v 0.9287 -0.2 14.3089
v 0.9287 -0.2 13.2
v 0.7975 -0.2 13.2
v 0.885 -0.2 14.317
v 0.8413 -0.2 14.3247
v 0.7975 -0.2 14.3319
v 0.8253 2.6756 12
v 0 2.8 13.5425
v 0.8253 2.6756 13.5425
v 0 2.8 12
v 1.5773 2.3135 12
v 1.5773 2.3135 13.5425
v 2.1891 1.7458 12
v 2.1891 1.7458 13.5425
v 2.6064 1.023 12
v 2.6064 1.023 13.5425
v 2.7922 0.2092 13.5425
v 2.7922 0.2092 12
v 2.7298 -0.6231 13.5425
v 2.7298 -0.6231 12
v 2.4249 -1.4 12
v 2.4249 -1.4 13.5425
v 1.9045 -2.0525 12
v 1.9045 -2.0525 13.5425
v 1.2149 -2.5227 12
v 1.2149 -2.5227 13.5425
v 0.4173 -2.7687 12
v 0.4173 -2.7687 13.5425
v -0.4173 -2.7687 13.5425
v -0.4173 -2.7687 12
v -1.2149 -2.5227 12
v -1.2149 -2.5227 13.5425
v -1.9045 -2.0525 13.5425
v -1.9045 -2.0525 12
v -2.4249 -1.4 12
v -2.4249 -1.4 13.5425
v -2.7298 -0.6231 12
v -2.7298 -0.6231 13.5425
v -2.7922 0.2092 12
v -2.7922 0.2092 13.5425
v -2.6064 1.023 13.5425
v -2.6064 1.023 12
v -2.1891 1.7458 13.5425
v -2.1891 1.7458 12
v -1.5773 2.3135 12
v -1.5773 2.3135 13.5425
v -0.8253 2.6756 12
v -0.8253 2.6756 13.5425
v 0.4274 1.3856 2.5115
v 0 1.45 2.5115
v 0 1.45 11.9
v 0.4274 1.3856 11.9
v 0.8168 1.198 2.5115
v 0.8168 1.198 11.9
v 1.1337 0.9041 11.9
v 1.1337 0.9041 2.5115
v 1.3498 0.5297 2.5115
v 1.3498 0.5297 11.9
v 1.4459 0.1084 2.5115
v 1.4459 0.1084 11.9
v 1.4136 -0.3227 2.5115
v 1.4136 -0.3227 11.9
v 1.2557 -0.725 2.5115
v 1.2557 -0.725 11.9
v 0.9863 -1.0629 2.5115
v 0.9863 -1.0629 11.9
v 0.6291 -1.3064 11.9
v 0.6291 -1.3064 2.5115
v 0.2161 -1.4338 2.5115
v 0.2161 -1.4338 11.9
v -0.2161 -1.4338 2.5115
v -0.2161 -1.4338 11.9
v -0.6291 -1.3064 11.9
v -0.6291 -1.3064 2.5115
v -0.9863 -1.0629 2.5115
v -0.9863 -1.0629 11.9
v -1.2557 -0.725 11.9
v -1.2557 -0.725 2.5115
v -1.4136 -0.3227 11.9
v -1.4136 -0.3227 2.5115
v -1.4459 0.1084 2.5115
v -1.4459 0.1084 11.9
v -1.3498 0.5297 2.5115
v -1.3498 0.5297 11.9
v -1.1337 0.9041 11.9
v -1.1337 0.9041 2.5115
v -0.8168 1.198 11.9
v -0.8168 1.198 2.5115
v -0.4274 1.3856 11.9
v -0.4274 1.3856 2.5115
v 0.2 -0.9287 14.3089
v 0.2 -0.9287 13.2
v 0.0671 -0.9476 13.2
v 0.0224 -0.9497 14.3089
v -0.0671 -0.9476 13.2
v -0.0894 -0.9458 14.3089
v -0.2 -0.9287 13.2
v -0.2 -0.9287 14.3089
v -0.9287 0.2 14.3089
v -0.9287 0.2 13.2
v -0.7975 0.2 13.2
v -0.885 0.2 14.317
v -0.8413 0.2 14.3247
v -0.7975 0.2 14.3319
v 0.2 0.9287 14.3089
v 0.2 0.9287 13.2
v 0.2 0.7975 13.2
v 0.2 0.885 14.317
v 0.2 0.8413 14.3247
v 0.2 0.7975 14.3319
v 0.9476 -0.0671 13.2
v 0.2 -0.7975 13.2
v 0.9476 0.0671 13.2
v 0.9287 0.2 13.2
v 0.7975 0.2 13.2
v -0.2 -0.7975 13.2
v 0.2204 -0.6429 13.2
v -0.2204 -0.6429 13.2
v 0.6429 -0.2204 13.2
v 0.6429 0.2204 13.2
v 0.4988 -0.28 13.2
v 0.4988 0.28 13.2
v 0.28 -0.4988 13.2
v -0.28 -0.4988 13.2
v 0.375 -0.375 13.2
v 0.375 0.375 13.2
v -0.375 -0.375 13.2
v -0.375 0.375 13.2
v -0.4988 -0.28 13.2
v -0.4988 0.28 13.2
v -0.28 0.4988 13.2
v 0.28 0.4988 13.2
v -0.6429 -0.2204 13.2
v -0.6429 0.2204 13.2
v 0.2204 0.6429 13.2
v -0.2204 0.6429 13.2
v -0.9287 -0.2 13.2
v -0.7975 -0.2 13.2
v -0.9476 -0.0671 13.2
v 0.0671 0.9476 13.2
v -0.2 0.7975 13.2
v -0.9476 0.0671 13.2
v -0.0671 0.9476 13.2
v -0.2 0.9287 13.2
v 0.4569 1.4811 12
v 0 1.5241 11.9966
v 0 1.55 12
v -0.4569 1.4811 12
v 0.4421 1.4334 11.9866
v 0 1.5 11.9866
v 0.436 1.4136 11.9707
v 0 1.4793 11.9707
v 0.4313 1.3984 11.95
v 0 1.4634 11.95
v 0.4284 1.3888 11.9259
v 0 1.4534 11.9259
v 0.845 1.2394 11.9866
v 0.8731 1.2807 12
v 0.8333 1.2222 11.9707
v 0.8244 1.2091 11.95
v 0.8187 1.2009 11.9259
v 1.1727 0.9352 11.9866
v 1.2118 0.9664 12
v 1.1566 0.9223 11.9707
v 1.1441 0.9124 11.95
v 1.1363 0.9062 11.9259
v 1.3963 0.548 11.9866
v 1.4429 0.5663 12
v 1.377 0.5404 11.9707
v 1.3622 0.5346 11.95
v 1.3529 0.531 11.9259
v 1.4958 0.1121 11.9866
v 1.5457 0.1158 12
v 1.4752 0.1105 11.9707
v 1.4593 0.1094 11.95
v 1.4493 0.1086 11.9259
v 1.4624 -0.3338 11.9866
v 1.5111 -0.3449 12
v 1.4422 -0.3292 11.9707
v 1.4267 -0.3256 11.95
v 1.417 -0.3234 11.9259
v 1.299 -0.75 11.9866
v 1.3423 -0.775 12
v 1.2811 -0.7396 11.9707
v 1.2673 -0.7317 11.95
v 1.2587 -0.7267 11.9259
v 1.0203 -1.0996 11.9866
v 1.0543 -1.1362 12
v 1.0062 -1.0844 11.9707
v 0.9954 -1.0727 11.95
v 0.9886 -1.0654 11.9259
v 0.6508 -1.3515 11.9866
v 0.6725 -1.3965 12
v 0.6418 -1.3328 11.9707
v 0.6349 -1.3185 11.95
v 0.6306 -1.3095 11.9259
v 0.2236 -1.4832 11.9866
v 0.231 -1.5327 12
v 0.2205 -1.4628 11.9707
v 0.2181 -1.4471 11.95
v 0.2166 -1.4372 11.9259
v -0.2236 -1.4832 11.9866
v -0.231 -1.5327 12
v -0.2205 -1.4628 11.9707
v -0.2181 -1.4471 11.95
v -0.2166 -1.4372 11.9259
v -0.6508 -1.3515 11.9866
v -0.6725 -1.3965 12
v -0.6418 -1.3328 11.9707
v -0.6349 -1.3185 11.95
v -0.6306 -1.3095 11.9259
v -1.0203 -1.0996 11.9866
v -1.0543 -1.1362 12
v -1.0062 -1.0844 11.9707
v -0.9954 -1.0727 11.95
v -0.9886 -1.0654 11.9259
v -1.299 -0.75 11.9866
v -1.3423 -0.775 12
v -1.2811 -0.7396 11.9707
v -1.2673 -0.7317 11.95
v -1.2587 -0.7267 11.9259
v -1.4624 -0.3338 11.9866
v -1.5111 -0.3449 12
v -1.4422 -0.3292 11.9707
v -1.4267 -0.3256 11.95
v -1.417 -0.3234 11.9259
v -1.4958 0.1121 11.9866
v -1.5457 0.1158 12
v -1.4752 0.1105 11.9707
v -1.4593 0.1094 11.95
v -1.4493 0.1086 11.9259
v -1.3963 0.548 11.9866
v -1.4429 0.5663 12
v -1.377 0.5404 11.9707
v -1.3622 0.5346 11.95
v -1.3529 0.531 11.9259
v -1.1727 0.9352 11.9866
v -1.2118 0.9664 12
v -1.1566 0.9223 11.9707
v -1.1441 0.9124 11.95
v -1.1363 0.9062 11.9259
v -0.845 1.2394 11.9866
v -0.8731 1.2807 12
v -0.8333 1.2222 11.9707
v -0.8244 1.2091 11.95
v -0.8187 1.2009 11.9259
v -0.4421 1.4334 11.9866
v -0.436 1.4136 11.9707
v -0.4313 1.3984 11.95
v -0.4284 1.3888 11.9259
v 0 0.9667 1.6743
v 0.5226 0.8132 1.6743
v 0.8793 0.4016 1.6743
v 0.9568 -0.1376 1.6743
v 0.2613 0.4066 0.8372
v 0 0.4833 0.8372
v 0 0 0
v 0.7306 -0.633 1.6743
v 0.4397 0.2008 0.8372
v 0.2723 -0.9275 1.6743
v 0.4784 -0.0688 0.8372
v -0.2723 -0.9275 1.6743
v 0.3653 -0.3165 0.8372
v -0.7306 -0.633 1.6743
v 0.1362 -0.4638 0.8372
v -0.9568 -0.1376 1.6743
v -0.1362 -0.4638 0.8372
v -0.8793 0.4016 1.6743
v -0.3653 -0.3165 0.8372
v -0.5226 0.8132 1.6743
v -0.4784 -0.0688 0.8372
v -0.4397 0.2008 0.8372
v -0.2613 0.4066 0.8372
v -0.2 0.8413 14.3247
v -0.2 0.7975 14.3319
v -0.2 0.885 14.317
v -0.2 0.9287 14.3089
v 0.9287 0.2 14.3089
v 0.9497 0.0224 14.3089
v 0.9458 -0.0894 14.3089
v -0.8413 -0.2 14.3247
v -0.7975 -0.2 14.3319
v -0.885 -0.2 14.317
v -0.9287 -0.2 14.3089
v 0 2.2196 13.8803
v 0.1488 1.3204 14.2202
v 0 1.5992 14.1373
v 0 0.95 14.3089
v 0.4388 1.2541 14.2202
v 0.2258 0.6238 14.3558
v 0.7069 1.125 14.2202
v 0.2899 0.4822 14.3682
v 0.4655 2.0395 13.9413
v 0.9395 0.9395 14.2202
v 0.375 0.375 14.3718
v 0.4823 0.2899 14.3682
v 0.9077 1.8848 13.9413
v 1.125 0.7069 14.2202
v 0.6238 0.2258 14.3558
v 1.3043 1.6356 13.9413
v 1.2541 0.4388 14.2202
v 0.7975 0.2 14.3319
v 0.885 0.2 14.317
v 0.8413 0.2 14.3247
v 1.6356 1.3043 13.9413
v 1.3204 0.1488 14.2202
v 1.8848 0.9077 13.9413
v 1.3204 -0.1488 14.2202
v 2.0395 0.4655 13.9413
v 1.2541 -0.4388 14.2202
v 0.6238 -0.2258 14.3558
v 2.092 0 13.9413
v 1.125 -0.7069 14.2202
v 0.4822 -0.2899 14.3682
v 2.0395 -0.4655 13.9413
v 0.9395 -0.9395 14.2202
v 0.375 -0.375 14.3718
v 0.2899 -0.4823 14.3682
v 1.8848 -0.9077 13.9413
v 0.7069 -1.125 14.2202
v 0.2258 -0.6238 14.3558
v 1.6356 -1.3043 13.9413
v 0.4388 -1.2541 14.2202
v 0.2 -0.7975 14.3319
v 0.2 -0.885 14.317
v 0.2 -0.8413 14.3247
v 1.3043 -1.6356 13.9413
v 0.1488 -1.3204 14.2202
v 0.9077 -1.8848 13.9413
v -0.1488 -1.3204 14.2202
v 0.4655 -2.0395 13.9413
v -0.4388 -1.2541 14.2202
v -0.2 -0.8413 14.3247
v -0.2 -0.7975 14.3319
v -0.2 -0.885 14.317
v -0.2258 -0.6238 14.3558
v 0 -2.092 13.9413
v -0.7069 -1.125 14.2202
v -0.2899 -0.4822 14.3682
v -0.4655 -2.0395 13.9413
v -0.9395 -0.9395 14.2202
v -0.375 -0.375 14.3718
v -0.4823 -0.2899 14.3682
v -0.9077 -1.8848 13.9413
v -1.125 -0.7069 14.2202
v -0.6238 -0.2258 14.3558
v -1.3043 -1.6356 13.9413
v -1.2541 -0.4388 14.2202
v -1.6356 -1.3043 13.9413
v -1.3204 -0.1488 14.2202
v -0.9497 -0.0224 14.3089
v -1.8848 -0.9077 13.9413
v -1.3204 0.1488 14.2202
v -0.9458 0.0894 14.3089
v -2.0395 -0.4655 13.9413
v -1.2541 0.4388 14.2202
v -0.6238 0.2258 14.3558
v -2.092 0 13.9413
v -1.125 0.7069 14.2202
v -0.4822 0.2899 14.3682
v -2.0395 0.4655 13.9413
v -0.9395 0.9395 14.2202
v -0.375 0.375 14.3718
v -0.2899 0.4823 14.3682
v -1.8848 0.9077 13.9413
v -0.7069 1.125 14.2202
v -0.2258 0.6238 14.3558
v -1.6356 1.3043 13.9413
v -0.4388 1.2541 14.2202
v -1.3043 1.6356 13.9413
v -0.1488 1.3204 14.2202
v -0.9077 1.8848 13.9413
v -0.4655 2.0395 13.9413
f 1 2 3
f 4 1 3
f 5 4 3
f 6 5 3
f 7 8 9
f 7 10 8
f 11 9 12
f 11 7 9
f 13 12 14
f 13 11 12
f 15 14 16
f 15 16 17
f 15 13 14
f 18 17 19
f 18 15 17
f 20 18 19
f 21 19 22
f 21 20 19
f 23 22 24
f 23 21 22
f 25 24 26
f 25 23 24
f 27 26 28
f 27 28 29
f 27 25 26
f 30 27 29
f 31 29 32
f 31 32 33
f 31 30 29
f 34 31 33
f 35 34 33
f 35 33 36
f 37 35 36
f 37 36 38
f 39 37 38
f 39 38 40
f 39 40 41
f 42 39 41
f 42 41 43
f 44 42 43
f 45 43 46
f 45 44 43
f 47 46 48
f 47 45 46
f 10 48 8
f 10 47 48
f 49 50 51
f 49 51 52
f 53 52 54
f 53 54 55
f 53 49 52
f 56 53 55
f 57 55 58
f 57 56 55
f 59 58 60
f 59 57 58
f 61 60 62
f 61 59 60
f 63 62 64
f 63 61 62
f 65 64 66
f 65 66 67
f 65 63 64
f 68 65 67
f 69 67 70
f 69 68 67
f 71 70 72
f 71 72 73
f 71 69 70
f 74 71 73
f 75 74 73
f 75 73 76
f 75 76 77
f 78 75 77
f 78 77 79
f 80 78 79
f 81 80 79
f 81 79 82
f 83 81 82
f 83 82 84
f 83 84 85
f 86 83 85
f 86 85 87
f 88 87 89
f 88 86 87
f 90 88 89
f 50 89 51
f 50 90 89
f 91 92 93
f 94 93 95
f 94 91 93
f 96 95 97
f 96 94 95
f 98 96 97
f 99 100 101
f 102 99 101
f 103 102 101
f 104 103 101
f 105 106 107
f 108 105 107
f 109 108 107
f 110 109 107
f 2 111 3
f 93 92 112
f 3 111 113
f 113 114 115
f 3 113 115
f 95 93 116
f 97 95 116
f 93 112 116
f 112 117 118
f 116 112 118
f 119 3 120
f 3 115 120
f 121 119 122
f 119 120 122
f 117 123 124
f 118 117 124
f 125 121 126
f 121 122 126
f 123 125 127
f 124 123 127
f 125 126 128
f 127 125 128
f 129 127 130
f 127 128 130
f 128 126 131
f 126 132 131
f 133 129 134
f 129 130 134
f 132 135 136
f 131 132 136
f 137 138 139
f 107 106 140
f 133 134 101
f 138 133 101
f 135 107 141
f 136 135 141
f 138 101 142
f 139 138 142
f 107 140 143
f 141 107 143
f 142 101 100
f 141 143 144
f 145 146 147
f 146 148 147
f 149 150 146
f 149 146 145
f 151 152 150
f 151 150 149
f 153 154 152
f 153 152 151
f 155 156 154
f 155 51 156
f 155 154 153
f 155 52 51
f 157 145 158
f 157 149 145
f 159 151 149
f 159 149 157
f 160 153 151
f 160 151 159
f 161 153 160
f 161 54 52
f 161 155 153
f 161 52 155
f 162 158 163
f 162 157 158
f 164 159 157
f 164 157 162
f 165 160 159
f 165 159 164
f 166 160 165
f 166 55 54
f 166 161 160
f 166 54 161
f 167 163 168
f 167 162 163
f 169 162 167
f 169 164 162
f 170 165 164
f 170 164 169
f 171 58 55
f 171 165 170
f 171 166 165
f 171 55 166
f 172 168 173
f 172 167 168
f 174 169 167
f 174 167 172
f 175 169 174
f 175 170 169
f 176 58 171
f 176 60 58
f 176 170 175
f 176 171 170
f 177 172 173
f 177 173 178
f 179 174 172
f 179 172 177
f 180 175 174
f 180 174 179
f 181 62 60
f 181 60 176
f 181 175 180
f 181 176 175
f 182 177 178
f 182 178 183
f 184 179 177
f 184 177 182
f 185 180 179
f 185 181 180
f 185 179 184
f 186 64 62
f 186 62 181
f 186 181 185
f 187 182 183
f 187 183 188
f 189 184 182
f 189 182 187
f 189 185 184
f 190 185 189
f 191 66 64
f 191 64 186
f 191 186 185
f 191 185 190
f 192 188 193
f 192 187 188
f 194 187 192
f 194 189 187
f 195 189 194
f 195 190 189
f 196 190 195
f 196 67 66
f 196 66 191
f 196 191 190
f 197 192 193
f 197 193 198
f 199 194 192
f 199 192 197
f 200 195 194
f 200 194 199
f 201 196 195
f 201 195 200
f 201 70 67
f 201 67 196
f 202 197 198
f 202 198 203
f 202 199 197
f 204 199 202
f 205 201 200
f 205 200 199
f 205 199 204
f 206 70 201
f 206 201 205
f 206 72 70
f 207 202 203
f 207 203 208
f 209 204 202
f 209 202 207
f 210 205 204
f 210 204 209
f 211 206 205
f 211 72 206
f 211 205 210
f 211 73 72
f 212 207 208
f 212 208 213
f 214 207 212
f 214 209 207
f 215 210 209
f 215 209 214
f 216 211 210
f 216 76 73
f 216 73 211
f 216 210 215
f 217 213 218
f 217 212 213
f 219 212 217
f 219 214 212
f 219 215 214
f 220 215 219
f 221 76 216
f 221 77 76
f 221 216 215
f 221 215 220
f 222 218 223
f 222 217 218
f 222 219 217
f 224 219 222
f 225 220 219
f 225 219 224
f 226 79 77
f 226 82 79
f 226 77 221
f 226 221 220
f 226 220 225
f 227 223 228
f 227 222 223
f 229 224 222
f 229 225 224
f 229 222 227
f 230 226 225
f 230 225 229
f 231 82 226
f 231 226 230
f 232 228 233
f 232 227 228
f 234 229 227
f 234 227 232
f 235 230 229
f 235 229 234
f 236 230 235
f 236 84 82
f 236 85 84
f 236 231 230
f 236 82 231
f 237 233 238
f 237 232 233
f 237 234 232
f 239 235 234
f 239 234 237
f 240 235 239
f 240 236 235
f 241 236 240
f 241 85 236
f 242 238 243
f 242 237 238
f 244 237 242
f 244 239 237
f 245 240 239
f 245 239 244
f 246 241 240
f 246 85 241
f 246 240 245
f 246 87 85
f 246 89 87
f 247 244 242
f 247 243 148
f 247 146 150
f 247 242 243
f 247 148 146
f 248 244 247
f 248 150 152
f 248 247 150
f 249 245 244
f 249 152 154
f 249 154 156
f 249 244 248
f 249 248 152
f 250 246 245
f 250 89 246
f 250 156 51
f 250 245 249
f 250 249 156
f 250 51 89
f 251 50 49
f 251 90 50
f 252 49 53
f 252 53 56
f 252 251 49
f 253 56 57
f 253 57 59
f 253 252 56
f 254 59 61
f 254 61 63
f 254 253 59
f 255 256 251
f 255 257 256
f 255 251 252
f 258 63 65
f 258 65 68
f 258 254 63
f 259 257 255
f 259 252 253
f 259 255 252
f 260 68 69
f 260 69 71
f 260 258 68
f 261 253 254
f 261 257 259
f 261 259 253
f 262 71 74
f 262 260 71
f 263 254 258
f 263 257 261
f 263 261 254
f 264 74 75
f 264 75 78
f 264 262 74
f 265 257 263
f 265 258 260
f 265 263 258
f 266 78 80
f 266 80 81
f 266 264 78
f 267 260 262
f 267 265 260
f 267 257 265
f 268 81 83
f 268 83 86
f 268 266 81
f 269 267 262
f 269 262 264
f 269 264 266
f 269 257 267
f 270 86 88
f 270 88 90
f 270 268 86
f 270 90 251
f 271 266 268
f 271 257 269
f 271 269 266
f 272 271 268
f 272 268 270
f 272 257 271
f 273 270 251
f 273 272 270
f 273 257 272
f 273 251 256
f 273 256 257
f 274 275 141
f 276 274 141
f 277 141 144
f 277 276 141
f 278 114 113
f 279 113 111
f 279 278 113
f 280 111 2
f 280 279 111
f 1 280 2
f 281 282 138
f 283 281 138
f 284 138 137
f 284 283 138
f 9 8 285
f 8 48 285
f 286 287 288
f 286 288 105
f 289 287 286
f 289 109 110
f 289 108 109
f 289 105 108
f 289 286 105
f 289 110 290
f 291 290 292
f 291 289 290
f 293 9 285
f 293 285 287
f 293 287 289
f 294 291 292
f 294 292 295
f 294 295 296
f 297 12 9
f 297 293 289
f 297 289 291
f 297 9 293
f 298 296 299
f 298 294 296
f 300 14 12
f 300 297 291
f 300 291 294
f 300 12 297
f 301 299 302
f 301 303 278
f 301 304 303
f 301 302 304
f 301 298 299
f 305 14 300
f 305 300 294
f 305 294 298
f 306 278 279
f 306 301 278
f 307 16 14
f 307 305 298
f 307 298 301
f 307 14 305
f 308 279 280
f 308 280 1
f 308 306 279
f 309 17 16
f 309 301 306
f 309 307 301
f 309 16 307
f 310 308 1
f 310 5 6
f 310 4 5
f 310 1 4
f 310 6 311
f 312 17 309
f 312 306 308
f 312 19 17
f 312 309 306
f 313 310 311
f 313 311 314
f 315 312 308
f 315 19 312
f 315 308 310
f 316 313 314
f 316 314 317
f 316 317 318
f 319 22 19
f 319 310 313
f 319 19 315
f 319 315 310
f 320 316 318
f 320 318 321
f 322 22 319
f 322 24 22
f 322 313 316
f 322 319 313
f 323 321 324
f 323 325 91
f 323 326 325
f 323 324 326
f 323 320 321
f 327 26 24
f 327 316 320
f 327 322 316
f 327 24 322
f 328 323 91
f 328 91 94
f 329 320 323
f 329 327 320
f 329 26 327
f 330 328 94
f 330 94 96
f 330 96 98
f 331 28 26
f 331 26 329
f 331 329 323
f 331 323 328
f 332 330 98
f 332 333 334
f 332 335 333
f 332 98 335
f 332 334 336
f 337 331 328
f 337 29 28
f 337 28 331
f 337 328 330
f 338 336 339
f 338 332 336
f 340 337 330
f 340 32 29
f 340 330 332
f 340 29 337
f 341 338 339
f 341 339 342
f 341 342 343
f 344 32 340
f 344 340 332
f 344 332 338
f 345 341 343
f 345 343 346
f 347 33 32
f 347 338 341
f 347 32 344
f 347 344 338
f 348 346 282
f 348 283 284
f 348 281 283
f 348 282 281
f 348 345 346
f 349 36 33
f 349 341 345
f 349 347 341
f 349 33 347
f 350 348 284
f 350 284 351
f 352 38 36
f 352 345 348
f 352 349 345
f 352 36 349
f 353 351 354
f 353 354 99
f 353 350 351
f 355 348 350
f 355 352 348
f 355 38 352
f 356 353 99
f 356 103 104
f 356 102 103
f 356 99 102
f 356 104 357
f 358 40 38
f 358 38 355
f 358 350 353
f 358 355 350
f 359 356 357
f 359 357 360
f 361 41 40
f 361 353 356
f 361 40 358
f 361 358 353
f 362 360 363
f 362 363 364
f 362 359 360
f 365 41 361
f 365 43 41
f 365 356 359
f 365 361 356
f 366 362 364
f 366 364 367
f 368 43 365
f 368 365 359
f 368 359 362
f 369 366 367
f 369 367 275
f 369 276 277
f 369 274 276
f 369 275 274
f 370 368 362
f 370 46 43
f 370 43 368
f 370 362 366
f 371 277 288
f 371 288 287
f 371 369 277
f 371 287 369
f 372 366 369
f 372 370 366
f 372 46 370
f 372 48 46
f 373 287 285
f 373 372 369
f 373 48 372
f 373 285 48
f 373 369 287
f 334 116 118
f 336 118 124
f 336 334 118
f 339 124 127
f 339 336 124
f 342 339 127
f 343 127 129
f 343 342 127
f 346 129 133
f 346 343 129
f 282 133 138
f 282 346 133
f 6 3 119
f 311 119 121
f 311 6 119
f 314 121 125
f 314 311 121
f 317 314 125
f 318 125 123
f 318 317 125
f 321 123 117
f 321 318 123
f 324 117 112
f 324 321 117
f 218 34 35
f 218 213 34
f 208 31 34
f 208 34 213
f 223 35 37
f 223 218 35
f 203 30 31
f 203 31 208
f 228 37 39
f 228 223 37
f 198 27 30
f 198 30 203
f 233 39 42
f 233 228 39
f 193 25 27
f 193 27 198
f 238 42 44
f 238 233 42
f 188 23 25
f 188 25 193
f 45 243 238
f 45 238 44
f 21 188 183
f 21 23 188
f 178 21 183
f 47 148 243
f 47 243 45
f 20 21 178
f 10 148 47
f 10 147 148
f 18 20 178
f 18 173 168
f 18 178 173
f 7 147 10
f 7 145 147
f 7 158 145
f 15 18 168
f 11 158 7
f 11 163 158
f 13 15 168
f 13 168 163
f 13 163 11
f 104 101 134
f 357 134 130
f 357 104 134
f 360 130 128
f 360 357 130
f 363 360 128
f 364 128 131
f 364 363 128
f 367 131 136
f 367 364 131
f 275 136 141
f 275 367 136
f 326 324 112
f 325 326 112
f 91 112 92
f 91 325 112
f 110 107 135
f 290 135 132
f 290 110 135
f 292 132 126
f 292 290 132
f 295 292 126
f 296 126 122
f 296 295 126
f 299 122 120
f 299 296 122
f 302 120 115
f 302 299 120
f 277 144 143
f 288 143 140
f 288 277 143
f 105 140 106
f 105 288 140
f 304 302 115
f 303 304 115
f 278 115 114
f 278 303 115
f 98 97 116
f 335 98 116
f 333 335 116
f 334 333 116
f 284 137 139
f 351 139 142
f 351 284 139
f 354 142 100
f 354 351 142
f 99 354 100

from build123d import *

# Parameters (mm, degrees)
CUT_EXTRUDE_2_DEPTH = 1.2
FILLET_1_R          = 0.1


with BuildPart() as part:
    # 草图8 → Revolve 1380 (revolve)
    with BuildSketch(Plane(origin=(0, 0, 0), x_dir=(0, 0, -1), z_dir=(1, 0, 0))):
        with BuildLine():
            Line((0, 0), (-14.4, 0))
            ThreePointArc((-14.4, 0), (-14.180811394, 1.464186604), (-13.542463035, 2.8))
            Line((-13.542463035, 2.8), (-12, 2.8))
            Line((-12, 2.8), (-12, 1.45))
            Line((-12, 1.45), (-2.511473671, 1.45))
            Line((-2.511473671, 1.45), (0, 0))
        make_face()
    revolve(axis=Axis((0, 0, 11.71), (0, 0, -1)))

    # 草图7 → 切除-拉伸2 (cut)
    with BuildSketch(Plane.XY.offset(14.4)):
        with BuildLine():
            Line((0.2, 0.928708781), (0.2, 0.797500009))
            ThreePointArc((0.2, 0.797500009), (0.375003701, 0.375003701), (0.797500009, 0.2))
            Line((0.797500009, 0.2), (0.928708781, 0.2))
            ThreePointArc((0.928708781, 0.2), (0.95, 0), (0.928708781, -0.2))
            Line((0.928708781, -0.2), (0.797500009, -0.2))
            ThreePointArc((0.797500009, -0.2), (0.375003701, -0.375003701), (0.2, -0.797500009))
            Line((0.2, -0.797500009), (0.2, -0.928708781))
            ThreePointArc((0.2, -0.928708781), (0, -0.95), (-0.2, -0.928708781))
            Line((-0.2, -0.928708781), (-0.2, -0.797500009))
            ThreePointArc((-0.2, -0.797500009), (-0.375003701, -0.375003701), (-0.797500009, -0.2))
            Line((-0.797500009, -0.2), (-0.928708781, -0.2))
            ThreePointArc((-0.928708781, -0.2), (-0.95, 0), (-0.928708781, 0.2))
            Line((-0.928708781, 0.2), (-0.797500009, 0.2))
            ThreePointArc((-0.797500009, 0.2), (-0.375003701, 0.375003701), (-0.2, 0.797500009))
            Line((-0.2, 0.797500009), (-0.2, 0.928708781))
            ThreePointArc((-0.2, 0.928708781), (0, 0.95), (0.2, 0.928708781))
        make_face()
    extrude(amount=-CUT_EXTRUDE_2_DEPTH, mode=Mode.SUBTRACT)

    # 圆角1
    fillet_1_edges = [part.edges().sort_by_distance(p)[0] for p in [
        (0, -1.45, 12),
    ]]
    fillet(fillet_1_edges, radius=FILLET_1_R)


solid = part.part
